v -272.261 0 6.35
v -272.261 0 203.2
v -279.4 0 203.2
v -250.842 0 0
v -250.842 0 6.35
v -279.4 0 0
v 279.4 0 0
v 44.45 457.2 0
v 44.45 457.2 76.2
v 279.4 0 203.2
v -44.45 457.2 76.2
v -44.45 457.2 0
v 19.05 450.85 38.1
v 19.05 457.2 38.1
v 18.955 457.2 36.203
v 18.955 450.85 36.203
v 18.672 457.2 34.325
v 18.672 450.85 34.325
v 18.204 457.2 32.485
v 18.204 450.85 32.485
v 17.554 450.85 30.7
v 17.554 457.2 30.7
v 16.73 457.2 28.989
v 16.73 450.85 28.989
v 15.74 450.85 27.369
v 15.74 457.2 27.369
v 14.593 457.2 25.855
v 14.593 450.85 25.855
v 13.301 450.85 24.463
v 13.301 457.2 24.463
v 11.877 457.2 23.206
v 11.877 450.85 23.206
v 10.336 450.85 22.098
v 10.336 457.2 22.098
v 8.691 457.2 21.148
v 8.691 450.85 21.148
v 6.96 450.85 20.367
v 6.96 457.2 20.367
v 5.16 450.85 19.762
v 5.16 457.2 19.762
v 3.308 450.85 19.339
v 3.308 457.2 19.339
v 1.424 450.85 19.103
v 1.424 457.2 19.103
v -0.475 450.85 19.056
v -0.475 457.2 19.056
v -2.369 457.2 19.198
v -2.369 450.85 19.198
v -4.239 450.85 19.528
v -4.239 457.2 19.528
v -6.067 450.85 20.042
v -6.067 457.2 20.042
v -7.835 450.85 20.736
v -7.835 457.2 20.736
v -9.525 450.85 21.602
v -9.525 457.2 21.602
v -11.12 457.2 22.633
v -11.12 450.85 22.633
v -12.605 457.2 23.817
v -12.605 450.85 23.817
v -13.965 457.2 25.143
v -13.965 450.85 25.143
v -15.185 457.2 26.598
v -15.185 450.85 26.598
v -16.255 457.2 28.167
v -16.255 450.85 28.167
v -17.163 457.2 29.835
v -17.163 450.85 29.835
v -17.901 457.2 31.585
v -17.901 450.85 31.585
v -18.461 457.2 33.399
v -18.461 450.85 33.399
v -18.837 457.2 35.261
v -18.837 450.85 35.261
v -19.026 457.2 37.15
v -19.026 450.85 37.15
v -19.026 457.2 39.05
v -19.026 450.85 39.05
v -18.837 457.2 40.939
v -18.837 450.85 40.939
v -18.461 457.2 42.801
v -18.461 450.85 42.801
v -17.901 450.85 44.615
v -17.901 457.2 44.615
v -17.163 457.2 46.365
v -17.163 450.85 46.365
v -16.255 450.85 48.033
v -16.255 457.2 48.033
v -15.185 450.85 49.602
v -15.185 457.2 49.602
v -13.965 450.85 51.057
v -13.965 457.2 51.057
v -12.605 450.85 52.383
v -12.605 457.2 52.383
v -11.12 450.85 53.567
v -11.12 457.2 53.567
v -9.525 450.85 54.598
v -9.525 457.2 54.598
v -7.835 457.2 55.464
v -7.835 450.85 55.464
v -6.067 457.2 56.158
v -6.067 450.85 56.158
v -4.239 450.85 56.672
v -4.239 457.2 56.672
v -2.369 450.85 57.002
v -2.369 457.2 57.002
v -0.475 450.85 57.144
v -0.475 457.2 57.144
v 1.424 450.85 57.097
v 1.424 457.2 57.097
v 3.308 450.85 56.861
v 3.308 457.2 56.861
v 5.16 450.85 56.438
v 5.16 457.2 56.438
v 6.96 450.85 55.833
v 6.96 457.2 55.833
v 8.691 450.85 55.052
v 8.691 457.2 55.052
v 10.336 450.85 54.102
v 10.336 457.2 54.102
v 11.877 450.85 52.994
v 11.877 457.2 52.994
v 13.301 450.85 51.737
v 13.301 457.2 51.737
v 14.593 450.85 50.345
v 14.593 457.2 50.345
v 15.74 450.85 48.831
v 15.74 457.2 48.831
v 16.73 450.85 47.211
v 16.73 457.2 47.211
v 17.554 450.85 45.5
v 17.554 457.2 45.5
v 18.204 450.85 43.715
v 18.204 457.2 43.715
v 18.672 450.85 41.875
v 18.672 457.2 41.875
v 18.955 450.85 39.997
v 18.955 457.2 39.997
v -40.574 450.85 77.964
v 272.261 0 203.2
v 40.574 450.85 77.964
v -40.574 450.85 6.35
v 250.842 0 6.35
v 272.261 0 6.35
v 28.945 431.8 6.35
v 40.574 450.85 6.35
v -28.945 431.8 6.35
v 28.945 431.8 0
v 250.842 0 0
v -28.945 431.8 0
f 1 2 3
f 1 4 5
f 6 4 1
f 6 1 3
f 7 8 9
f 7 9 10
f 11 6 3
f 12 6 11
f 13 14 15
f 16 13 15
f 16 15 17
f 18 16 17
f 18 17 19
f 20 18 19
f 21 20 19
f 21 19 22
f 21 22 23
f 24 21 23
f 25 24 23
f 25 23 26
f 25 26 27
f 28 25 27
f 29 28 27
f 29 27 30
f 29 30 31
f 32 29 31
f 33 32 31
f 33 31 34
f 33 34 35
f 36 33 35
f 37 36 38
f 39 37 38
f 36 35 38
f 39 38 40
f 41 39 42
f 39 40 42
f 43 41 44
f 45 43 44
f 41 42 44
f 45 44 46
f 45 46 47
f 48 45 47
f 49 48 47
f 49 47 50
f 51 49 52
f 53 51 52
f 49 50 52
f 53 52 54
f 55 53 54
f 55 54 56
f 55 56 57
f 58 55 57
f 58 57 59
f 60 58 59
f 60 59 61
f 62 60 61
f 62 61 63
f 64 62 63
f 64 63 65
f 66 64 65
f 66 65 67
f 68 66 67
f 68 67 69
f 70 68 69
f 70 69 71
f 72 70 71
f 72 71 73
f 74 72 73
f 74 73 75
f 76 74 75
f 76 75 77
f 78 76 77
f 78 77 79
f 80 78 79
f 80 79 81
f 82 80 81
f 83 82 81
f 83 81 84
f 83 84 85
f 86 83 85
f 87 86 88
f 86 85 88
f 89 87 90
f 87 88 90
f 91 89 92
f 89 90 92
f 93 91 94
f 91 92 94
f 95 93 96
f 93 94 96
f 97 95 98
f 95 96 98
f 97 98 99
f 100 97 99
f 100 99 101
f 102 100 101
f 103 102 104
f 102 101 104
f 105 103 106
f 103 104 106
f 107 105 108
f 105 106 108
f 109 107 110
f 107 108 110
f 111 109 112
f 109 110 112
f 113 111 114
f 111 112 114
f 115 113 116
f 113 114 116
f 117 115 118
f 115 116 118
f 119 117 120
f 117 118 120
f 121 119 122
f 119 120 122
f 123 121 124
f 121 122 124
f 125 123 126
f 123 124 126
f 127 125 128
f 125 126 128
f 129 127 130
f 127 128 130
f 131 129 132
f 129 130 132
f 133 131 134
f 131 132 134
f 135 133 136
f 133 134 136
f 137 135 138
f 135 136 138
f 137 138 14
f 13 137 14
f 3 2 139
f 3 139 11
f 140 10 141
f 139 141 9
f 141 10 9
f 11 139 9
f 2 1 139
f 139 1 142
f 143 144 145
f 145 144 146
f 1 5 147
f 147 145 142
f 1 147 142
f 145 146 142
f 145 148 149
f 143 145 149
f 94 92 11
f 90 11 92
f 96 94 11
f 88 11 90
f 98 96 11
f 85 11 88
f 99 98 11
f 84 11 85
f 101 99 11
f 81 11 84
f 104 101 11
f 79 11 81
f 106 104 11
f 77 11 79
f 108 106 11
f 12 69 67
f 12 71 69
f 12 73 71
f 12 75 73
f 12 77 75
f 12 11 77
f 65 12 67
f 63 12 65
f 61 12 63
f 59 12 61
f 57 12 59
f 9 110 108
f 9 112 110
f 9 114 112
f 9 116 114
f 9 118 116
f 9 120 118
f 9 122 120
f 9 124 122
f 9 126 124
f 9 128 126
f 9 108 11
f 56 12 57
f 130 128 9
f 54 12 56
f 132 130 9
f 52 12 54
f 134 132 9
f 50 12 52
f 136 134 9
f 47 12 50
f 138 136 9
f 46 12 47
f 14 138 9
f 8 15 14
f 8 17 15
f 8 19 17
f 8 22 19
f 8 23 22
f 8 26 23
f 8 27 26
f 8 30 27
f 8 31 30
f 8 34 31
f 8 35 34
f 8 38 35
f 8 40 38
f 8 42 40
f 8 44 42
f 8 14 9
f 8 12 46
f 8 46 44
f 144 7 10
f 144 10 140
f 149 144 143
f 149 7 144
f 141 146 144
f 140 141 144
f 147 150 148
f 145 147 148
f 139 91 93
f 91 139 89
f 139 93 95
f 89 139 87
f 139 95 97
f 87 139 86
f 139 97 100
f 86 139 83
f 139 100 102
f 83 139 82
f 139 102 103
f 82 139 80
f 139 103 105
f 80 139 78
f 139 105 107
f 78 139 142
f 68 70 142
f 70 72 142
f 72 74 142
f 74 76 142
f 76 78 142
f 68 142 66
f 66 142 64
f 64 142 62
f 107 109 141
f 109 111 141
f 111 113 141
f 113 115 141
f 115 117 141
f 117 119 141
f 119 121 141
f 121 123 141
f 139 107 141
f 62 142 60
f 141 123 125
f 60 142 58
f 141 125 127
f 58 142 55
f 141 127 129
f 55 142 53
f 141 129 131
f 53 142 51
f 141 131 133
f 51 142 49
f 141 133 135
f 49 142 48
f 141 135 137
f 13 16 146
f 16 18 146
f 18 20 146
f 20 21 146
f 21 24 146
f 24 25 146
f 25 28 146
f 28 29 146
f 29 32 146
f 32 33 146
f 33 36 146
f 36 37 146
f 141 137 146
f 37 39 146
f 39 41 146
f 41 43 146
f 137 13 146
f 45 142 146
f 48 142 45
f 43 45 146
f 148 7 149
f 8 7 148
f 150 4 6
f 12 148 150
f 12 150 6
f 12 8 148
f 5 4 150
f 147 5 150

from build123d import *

# Parameters (mm, degrees)
BOSS_EXTRUDE1_DEPTH     = 203.2
CUT_EXTRUDE1_DEPTH      = 280.4
CUT_EXTRUDE1_DEPTH_BACK = 280.4
SHELL1_T                = -6.35
CUT_EXTRUDE2_DEPTH      = 204.2
SKETCH4_R               = 19.05
CUT_EXTRUDE3_DEPTH      = 458.2


with BuildPart() as part:
    # Sketch1 → Boss-Extrude1 (new body)
    with BuildSketch(Plane.XY):
        Polygon((-279.4, 0), (-44.45, 457.2), (44.45, 457.2), (279.4, 0), align=None)
    extrude(amount=BOSS_EXTRUDE1_DEPTH)

    # Sketch2 → Cut-Extrude1 (cut, two sides)
    with BuildSketch(Plane(origin=(0, 0, 0), x_dir=(0, 0, -1), z_dir=(1, 0, 0))) as cut_extrude1_sk:
        Polygon((-203.2, 0), (-76.2, 457.2), (-203.2, 457.2), align=None)
    extrude(amount=CUT_EXTRUDE1_DEPTH, mode=Mode.SUBTRACT)
    extrude(cut_extrude1_sk.sketch, amount=-CUT_EXTRUDE1_DEPTH_BACK, mode=Mode.SUBTRACT)

    # Shell1
    shell1_openings = [part.faces().sort_by_distance(p)[0] for p in [
        (0, 228.6, 139.7),
        (0, 0, 101.6),
    ]]
    offset(amount=SHELL1_T, openings=shell1_openings, kind=Kind.INTERSECTION)

    # Sketch3 → Cut-Extrude2 (cut, through all)
    with BuildSketch(Plane(origin=(0, 0, 0), x_dir=(-1, 0, 0), z_dir=(0, 0, -1))):
        Polygon((250.842426439, 0), (28.945204216, 431.8), (-28.945204216, 431.8), (-250.842426439, 0), align=None)
    extrude(amount=-CUT_EXTRUDE2_DEPTH, mode=Mode.SUBTRACT)

    # Sketch4 → Cut-Extrude3 (cut, through all)
    with BuildSketch(Plane(origin=(0, 457.2, 0), x_dir=(1, 0, 0), z_dir=(0, 1, 0))):
        with Locations((0, -38.1)):
            Circle(SKETCH4_R)
    extrude(amount=-CUT_EXTRUDE3_DEPTH, mode=Mode.SUBTRACT)


solid = part.part
